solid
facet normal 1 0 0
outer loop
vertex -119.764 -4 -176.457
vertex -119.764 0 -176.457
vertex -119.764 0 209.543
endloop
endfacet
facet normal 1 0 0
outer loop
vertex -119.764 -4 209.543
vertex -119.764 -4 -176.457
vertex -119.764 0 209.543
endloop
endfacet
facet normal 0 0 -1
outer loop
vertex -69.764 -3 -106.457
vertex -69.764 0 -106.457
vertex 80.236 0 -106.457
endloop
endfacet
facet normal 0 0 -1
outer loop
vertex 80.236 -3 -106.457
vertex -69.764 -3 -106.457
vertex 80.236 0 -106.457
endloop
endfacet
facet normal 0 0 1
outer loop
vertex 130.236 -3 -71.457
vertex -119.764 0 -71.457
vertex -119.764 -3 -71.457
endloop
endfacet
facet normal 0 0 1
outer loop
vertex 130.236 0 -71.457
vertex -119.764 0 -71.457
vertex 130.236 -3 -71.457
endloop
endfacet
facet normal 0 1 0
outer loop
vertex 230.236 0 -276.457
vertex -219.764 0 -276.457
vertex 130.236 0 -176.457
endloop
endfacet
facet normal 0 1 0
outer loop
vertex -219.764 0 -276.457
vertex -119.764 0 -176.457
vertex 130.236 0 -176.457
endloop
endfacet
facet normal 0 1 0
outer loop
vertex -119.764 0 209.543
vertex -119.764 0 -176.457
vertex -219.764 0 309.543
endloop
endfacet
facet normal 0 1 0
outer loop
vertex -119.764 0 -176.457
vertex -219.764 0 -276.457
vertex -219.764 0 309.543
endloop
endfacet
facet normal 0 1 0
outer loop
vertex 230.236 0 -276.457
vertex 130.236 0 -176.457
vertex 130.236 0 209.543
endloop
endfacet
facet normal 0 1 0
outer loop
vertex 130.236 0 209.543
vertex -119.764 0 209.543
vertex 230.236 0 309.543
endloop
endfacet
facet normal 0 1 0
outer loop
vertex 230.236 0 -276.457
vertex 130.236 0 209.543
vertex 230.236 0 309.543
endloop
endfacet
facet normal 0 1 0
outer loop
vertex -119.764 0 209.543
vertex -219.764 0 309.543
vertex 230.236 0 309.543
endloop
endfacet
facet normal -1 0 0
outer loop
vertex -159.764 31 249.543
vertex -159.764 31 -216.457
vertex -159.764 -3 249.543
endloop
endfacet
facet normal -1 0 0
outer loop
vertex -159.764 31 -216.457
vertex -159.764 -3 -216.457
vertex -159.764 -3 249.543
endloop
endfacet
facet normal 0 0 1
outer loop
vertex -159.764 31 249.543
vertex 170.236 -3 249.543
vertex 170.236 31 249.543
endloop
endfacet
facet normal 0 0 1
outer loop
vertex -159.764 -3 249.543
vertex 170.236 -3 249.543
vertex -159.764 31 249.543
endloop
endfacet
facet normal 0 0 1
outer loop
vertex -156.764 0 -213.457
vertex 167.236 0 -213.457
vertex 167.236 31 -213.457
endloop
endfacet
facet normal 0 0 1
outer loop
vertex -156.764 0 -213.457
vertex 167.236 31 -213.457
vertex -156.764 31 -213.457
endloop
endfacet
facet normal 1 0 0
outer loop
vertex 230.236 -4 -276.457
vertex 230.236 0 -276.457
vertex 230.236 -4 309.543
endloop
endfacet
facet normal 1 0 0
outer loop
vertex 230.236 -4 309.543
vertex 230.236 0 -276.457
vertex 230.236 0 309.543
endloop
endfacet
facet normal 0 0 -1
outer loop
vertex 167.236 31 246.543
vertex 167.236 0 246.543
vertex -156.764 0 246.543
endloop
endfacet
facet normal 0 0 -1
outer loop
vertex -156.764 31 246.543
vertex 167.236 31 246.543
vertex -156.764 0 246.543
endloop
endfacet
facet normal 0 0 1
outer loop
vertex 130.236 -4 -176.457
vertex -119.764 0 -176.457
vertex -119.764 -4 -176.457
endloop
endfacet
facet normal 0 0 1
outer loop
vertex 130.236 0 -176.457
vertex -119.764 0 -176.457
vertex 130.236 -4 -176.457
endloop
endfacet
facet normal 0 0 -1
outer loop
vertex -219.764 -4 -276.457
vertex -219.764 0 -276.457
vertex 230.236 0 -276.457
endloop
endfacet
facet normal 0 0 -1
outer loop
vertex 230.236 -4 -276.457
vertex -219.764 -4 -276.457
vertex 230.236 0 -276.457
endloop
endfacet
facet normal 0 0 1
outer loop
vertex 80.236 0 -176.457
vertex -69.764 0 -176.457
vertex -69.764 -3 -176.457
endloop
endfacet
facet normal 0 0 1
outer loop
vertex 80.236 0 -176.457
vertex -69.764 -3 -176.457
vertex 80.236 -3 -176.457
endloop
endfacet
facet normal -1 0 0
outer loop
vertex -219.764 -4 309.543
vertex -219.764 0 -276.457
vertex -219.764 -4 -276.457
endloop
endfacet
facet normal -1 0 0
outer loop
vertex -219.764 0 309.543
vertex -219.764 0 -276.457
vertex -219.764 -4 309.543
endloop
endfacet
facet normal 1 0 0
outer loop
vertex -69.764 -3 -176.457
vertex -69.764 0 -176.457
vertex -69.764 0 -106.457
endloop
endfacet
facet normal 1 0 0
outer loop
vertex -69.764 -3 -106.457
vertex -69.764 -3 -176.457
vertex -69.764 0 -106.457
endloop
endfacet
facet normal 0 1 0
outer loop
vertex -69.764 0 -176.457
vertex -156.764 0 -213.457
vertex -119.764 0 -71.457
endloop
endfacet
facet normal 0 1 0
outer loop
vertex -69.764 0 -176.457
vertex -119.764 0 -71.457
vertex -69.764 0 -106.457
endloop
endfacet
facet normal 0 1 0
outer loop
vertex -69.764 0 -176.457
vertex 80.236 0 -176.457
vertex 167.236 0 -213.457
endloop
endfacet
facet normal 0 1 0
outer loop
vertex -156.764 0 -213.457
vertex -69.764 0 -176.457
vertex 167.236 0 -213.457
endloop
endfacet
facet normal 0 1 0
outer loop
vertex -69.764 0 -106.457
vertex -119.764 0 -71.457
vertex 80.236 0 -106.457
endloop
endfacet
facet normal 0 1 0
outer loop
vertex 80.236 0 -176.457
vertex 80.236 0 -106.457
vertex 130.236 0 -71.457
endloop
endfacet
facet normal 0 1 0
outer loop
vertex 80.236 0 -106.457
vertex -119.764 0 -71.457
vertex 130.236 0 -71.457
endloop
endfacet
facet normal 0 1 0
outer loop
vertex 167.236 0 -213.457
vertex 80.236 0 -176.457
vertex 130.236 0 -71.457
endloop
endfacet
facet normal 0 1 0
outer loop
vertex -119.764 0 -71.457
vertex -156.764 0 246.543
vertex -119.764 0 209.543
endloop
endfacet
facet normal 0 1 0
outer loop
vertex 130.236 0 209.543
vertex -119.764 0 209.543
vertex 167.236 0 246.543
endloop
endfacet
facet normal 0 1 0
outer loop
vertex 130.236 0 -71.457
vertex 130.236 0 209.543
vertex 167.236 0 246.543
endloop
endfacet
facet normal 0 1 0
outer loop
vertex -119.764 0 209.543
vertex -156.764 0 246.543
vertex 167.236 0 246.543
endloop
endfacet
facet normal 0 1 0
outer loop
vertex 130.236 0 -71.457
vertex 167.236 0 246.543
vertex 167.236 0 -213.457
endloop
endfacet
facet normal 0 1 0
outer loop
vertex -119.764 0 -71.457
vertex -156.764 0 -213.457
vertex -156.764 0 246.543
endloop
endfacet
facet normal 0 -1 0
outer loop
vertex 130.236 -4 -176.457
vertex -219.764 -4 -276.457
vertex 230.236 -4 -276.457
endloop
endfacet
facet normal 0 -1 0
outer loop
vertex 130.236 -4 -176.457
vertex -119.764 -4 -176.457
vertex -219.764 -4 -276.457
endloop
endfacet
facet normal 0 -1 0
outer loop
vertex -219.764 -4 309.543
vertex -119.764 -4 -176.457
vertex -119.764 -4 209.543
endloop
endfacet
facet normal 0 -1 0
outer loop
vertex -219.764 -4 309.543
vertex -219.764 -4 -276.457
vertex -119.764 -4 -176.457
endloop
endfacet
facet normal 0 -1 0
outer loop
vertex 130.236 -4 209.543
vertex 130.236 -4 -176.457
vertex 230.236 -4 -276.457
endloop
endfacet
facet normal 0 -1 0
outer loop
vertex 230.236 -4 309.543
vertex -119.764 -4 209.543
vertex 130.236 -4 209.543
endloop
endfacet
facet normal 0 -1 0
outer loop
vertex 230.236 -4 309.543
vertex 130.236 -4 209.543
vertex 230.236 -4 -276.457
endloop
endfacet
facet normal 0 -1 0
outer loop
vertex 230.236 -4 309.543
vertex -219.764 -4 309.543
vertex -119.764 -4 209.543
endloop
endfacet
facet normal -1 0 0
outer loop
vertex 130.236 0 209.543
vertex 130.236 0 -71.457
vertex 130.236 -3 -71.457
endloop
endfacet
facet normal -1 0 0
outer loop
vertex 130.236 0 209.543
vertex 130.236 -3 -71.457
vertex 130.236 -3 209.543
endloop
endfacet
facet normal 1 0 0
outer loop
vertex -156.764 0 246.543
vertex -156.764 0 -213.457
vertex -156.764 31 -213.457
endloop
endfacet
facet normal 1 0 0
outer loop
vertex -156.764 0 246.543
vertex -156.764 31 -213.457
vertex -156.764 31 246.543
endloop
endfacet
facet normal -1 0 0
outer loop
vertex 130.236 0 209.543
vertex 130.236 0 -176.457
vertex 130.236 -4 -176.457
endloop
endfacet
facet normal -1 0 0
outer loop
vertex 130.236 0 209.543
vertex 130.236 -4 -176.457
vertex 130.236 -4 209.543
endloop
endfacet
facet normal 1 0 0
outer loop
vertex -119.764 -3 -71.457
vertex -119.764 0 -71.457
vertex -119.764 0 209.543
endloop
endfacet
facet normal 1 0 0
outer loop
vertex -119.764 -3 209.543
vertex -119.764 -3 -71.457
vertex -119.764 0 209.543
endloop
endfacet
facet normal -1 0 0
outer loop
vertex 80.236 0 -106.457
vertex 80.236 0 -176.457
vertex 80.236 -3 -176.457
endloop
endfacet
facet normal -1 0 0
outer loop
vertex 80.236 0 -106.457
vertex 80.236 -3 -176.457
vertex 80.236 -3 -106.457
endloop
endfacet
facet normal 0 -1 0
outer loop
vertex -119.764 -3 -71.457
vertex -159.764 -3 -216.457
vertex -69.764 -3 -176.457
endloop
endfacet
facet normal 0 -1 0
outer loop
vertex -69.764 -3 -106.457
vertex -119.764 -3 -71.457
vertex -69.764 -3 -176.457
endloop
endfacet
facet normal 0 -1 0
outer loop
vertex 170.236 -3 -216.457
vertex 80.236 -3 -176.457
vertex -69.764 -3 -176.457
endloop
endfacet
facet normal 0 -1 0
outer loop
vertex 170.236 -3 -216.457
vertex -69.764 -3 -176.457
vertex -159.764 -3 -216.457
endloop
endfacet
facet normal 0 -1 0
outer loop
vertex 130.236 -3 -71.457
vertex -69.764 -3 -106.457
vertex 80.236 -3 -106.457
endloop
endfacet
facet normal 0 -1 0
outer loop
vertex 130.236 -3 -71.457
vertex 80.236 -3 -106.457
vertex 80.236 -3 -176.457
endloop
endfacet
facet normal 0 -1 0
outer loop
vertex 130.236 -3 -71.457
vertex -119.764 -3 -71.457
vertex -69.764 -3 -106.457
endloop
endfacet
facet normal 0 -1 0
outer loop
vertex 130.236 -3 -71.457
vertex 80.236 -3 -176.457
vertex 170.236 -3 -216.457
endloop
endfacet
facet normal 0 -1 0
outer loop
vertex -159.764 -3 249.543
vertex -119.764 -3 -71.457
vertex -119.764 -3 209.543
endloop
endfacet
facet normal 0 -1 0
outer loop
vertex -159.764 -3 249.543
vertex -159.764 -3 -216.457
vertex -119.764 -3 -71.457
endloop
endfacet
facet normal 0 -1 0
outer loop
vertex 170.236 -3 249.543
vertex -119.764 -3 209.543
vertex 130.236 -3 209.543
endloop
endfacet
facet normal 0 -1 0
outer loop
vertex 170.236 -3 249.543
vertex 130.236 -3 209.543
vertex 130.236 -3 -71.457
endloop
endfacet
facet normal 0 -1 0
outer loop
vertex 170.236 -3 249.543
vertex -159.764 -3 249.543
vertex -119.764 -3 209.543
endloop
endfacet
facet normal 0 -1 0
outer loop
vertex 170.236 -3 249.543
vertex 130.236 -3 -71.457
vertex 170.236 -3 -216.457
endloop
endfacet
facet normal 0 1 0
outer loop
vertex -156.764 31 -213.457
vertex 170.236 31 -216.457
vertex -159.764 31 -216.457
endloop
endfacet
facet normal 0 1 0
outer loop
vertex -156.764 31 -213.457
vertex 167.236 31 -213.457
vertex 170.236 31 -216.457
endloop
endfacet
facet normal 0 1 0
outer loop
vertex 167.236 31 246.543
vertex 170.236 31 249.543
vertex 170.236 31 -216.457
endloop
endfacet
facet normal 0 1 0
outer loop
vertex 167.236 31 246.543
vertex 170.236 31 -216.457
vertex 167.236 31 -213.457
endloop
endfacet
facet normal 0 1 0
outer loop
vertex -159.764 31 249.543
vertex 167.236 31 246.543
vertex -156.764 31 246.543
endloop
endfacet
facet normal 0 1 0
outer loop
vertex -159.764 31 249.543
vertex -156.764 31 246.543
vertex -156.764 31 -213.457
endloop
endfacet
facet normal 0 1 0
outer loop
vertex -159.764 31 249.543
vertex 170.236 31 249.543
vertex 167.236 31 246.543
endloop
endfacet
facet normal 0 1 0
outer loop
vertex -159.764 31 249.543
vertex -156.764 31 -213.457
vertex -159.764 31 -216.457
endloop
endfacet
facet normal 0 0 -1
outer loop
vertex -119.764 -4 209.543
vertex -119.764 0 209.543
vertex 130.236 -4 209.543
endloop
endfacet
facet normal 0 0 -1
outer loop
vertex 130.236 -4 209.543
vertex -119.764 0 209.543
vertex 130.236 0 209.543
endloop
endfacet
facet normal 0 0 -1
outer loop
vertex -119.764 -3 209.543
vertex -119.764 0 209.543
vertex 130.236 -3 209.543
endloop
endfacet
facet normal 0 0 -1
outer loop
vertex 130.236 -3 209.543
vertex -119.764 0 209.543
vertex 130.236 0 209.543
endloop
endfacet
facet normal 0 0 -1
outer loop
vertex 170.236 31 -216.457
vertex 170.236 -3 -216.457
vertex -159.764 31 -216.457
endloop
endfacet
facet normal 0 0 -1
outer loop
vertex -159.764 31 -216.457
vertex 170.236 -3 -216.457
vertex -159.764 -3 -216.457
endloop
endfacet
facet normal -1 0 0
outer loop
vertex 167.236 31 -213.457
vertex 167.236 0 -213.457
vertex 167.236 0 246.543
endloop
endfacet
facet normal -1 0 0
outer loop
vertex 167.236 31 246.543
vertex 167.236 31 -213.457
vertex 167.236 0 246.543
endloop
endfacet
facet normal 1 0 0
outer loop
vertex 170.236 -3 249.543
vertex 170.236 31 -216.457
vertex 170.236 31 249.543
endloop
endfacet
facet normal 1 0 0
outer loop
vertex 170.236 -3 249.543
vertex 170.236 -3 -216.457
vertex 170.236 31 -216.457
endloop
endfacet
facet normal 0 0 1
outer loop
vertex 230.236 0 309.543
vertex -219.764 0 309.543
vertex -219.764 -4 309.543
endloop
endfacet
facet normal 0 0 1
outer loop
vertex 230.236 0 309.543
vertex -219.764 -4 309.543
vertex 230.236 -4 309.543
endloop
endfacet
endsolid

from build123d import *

# Parameters (mm, degrees)
F0_W     = 450
F0_H     = 586
F0_W_2   = 250
F0_H_2   = 386
F1_DEPTH = 4
F2_W     = 330
F2_H     = 466
F2_W_2   = 150
F2_H_2   = 70
F2_W_3   = 250
F2_H_3   = 281
F3_DEPTH = 3
F4_W     = 330
F4_H     = 466
F4_W_2   = 324
F4_H_2   = 460
F5_DEPTH = 31


with BuildPart() as f1:
    # F0 (on Front) → F1 (new body)
    with BuildSketch(Plane.XZ):
        with Locations((5.2358553946, 16.5430586814)):
            Rectangle(F0_W, F0_H)
        with Locations((5.2358553946, 16.5430586814)):
            Rectangle(F0_W_2, F0_H_2, mode=Mode.SUBTRACT)
    extrude(amount=F1_DEPTH)


with BuildPart() as f3:
    # F2 (on Front) → F3 (new body)
    with BuildSketch(Plane.XZ):
        with Locations((5.2358553946, 16.5430586814)):
            Rectangle(F2_W, F2_H)
        with Locations((5.2358553946, -141.4569413186)):
            Rectangle(F2_W_2, F2_H_2, mode=Mode.SUBTRACT)
        with Locations((5.2358553946, 69.0430586814)):
            Rectangle(F2_W_3, F2_H_3, mode=Mode.SUBTRACT)
    extrude(amount=F3_DEPTH)

    # F4 (on face) → F5 (join)
    with BuildSketch(Plane(origin=(0, 0, 0), x_dir=(-1, 0, 0), z_dir=(0, 1, 0))):
        with Locations((-5.2358553946, 16.5430586814)):
            Rectangle(F4_W, F4_H)
        with Locations((-5.2358553946, 16.5430586814)):
            Rectangle(F4_W_2, F4_H_2, mode=Mode.SUBTRACT)
    extrude(amount=F5_DEPTH)


solid = Compound([f1.part, f3.part])
